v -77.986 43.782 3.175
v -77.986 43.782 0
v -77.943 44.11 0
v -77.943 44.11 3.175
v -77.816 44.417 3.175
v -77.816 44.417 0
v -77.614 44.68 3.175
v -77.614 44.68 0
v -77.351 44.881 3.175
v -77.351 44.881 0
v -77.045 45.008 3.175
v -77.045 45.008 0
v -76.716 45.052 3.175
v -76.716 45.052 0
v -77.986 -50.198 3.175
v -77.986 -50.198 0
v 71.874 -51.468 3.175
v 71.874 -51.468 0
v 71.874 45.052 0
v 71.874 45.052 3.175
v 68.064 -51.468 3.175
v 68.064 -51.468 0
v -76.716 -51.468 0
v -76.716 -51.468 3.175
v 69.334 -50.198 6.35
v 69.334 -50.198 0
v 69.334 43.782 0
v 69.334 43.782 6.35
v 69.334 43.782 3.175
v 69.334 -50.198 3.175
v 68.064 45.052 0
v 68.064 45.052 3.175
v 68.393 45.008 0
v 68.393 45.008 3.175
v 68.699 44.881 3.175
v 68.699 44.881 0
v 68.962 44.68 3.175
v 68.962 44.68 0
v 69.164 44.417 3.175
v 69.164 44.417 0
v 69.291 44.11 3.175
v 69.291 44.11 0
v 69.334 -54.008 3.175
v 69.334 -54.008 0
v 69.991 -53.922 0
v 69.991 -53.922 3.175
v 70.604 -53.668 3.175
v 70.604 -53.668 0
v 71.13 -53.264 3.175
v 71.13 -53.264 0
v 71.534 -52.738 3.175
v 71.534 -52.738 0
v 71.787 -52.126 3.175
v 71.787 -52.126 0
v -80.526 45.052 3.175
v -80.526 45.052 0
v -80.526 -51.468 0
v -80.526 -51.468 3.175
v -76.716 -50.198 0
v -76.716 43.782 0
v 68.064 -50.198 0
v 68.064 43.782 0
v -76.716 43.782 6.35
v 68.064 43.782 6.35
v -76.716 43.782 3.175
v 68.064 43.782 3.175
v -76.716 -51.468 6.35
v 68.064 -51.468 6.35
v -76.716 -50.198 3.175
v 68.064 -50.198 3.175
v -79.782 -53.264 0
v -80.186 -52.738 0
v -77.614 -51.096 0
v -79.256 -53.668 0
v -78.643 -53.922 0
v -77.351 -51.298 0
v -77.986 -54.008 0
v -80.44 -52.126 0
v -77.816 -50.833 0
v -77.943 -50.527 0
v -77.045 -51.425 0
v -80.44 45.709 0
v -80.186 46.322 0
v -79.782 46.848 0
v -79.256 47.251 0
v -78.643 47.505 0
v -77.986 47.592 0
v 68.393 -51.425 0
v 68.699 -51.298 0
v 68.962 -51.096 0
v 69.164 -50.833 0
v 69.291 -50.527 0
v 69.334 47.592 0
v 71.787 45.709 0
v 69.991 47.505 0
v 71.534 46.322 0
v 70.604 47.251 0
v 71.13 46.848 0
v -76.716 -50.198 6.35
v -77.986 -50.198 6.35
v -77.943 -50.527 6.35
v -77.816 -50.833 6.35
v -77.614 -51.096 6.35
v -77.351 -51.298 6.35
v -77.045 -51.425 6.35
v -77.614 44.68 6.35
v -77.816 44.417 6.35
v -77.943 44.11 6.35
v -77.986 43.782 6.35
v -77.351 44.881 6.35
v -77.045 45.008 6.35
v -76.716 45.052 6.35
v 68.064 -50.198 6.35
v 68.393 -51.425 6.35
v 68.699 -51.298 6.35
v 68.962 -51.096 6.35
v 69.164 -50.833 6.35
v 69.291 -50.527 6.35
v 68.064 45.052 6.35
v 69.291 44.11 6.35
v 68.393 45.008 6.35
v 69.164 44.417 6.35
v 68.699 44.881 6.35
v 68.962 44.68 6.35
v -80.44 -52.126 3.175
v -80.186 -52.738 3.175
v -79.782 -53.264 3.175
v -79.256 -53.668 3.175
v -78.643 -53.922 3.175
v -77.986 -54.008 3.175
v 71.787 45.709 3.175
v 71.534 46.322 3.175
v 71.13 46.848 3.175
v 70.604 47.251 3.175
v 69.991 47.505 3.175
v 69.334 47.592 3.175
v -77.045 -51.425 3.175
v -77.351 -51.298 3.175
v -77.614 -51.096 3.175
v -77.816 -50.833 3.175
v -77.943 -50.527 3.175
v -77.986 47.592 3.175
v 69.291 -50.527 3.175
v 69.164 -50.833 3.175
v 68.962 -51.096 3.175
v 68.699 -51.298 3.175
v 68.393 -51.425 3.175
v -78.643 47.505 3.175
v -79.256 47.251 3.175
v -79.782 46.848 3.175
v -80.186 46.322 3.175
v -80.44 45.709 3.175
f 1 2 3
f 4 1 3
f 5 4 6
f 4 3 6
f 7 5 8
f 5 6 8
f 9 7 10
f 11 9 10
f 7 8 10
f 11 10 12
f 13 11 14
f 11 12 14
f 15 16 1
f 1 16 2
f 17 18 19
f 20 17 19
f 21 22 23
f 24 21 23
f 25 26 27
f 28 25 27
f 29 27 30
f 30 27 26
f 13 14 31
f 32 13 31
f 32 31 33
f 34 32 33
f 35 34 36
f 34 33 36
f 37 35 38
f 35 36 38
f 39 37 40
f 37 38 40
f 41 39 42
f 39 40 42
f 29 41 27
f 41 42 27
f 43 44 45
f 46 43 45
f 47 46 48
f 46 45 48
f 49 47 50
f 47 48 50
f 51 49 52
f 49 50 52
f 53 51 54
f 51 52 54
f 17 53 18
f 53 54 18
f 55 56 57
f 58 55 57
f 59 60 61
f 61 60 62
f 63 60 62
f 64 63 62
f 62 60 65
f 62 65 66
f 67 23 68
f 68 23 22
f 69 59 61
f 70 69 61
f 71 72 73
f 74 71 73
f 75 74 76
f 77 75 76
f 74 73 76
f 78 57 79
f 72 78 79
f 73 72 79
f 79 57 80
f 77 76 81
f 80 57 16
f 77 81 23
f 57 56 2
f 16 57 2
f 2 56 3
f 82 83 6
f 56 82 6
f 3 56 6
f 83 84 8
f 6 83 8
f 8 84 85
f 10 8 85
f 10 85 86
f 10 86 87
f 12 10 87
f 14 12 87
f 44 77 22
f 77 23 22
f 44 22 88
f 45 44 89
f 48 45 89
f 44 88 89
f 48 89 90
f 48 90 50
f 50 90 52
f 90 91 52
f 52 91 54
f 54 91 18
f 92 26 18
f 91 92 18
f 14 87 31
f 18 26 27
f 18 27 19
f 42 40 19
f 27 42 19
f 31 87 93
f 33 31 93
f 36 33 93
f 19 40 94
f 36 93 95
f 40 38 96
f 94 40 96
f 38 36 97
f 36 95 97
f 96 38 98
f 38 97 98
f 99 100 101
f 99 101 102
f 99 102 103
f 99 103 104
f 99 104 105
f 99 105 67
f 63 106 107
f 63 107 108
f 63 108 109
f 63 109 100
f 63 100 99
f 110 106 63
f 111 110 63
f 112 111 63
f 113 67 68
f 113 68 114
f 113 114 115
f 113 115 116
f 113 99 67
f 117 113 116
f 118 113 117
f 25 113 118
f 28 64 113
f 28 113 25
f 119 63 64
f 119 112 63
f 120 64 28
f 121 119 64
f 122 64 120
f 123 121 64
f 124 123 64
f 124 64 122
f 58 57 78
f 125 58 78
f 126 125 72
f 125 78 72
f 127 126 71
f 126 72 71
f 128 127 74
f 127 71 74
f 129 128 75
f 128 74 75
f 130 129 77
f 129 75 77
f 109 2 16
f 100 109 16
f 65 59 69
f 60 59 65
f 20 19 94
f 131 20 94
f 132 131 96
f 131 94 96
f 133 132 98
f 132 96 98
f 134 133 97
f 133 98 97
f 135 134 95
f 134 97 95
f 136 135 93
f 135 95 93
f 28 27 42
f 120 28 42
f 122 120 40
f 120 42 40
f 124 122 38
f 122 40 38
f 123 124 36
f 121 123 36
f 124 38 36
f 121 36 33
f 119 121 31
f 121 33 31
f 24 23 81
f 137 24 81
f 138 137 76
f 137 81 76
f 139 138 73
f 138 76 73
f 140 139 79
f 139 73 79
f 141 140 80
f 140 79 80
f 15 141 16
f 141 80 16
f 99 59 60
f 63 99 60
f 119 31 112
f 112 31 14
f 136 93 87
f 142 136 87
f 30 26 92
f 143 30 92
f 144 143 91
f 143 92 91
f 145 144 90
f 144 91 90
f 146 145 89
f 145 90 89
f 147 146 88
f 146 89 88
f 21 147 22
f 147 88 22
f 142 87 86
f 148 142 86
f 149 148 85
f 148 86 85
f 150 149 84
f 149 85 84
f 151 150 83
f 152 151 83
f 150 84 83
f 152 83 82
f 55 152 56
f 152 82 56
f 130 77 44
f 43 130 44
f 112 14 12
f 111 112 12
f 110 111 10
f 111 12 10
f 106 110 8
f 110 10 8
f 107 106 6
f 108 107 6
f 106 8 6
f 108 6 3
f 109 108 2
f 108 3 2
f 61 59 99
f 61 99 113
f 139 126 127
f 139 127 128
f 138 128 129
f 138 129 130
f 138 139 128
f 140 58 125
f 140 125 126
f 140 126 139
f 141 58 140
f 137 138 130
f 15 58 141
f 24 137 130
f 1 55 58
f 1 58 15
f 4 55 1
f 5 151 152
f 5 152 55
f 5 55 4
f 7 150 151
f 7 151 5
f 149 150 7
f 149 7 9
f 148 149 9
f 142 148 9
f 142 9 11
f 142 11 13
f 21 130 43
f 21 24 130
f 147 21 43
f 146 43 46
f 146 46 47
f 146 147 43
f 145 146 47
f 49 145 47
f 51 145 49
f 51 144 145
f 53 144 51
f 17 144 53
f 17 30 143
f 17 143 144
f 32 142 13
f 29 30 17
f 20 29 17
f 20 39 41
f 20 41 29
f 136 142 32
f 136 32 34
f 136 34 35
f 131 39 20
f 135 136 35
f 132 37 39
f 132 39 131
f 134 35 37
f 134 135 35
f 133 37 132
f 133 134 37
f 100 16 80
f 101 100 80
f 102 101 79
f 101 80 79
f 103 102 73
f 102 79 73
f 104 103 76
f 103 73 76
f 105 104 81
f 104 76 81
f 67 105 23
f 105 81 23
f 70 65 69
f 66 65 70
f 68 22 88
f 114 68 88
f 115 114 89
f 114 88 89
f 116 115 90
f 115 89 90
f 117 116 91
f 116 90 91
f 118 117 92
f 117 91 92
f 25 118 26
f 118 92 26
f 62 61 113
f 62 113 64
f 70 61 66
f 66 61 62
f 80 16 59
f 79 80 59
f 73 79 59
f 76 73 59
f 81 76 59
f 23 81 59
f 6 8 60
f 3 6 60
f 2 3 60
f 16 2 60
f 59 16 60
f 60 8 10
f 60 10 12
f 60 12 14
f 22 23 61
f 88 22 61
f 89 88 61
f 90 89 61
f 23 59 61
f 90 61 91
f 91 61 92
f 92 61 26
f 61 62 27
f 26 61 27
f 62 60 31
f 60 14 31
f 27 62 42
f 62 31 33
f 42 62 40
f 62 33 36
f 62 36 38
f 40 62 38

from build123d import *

# Parameters (mm, degrees)
F0_W     = 144.78
F0_H     = 93.98
F1_DEPTH = 3.175
F2_DEPTH = 6.35


with BuildPart() as f1:
    # F0 (on Top) → F1 (new body)
    with BuildSketch(Plane.XY):
        with BuildLine():
            Line((69.333904, 47.59158), (-77.986096, 47.59158))
            ThreePointArc((-77.986096, 47.59158), (-79.782147, 46.847632), (-80.526096, 45.05158))
            Line((-80.526096, 45.05158), (-80.526096, -51.46842))
            ThreePointArc((-80.526096, -51.46842), (-79.782147, -53.264471), (-77.986096, -54.00842))
            Line((-77.986096, -54.00842), (69.333904, -54.00842))
            ThreePointArc((69.333904, -54.00842), (71.129955, -53.264471), (71.873904, -51.46842))
            Line((71.873904, -51.46842), (71.873904, 45.05158))
            ThreePointArc((71.873904, 45.05158), (71.129955, 46.847632), (69.333904, 47.59158))
        make_face()
        with BuildLine():
            ThreePointArc((-77.986096, 43.78158), (-77.614121, 44.679606), (-76.716096, 45.05158))
            Line((-76.716096, 45.05158), (68.063904, 45.05158))
            ThreePointArc((68.063904, 45.05158), (68.96193, 44.679606), (69.333904, 43.78158))
            Line((69.333904, 43.78158), (69.333904, -50.19842))
            ThreePointArc((69.333904, -50.19842), (68.96193, -51.096445), (68.063904, -51.46842))
            Line((68.063904, -51.46842), (-76.716096, -51.46842))
            ThreePointArc((-76.716096, -51.46842), (-77.614121, -51.096445), (-77.986096, -50.19842))
            Line((-77.986096, -50.19842), (-77.986096, 43.78158))
        make_face(mode=Mode.SUBTRACT)
        with Locations((-4.326096, -3.20842)):
            Rectangle(F0_W, F0_H)
    extrude(amount=F1_DEPTH)


with BuildPart() as f2:
    # F0 (on Top) → F2 (new body)
    with BuildSketch(Plane.XY):
        with BuildLine():
            Line((68.063904, 45.05158), (-76.716096, 45.05158))
            ThreePointArc((-76.716096, 45.05158), (-77.614121, 44.679606), (-77.986096, 43.78158))
            Line((-77.986096, 43.78158), (-77.986096, -50.19842))
            ThreePointArc((-77.986096, -50.19842), (-77.614121, -51.096445), (-76.716096, -51.46842))
            Line((-76.716096, -51.46842), (68.063904, -51.46842))
            ThreePointArc((68.063904, -51.46842), (68.96193, -51.096445), (69.333904, -50.19842))
            Line((69.333904, -50.19842), (69.333904, 43.78158))
            ThreePointArc((69.333904, 43.78158), (68.96193, 44.679606), (68.063904, 45.05158))
        make_face()
        with Locations((-4.326096, -3.20842)):
            Rectangle(F0_W, F0_H, mode=Mode.SUBTRACT)
    extrude(amount=F2_DEPTH)


solid = Compound([f1.part, f2.part])
